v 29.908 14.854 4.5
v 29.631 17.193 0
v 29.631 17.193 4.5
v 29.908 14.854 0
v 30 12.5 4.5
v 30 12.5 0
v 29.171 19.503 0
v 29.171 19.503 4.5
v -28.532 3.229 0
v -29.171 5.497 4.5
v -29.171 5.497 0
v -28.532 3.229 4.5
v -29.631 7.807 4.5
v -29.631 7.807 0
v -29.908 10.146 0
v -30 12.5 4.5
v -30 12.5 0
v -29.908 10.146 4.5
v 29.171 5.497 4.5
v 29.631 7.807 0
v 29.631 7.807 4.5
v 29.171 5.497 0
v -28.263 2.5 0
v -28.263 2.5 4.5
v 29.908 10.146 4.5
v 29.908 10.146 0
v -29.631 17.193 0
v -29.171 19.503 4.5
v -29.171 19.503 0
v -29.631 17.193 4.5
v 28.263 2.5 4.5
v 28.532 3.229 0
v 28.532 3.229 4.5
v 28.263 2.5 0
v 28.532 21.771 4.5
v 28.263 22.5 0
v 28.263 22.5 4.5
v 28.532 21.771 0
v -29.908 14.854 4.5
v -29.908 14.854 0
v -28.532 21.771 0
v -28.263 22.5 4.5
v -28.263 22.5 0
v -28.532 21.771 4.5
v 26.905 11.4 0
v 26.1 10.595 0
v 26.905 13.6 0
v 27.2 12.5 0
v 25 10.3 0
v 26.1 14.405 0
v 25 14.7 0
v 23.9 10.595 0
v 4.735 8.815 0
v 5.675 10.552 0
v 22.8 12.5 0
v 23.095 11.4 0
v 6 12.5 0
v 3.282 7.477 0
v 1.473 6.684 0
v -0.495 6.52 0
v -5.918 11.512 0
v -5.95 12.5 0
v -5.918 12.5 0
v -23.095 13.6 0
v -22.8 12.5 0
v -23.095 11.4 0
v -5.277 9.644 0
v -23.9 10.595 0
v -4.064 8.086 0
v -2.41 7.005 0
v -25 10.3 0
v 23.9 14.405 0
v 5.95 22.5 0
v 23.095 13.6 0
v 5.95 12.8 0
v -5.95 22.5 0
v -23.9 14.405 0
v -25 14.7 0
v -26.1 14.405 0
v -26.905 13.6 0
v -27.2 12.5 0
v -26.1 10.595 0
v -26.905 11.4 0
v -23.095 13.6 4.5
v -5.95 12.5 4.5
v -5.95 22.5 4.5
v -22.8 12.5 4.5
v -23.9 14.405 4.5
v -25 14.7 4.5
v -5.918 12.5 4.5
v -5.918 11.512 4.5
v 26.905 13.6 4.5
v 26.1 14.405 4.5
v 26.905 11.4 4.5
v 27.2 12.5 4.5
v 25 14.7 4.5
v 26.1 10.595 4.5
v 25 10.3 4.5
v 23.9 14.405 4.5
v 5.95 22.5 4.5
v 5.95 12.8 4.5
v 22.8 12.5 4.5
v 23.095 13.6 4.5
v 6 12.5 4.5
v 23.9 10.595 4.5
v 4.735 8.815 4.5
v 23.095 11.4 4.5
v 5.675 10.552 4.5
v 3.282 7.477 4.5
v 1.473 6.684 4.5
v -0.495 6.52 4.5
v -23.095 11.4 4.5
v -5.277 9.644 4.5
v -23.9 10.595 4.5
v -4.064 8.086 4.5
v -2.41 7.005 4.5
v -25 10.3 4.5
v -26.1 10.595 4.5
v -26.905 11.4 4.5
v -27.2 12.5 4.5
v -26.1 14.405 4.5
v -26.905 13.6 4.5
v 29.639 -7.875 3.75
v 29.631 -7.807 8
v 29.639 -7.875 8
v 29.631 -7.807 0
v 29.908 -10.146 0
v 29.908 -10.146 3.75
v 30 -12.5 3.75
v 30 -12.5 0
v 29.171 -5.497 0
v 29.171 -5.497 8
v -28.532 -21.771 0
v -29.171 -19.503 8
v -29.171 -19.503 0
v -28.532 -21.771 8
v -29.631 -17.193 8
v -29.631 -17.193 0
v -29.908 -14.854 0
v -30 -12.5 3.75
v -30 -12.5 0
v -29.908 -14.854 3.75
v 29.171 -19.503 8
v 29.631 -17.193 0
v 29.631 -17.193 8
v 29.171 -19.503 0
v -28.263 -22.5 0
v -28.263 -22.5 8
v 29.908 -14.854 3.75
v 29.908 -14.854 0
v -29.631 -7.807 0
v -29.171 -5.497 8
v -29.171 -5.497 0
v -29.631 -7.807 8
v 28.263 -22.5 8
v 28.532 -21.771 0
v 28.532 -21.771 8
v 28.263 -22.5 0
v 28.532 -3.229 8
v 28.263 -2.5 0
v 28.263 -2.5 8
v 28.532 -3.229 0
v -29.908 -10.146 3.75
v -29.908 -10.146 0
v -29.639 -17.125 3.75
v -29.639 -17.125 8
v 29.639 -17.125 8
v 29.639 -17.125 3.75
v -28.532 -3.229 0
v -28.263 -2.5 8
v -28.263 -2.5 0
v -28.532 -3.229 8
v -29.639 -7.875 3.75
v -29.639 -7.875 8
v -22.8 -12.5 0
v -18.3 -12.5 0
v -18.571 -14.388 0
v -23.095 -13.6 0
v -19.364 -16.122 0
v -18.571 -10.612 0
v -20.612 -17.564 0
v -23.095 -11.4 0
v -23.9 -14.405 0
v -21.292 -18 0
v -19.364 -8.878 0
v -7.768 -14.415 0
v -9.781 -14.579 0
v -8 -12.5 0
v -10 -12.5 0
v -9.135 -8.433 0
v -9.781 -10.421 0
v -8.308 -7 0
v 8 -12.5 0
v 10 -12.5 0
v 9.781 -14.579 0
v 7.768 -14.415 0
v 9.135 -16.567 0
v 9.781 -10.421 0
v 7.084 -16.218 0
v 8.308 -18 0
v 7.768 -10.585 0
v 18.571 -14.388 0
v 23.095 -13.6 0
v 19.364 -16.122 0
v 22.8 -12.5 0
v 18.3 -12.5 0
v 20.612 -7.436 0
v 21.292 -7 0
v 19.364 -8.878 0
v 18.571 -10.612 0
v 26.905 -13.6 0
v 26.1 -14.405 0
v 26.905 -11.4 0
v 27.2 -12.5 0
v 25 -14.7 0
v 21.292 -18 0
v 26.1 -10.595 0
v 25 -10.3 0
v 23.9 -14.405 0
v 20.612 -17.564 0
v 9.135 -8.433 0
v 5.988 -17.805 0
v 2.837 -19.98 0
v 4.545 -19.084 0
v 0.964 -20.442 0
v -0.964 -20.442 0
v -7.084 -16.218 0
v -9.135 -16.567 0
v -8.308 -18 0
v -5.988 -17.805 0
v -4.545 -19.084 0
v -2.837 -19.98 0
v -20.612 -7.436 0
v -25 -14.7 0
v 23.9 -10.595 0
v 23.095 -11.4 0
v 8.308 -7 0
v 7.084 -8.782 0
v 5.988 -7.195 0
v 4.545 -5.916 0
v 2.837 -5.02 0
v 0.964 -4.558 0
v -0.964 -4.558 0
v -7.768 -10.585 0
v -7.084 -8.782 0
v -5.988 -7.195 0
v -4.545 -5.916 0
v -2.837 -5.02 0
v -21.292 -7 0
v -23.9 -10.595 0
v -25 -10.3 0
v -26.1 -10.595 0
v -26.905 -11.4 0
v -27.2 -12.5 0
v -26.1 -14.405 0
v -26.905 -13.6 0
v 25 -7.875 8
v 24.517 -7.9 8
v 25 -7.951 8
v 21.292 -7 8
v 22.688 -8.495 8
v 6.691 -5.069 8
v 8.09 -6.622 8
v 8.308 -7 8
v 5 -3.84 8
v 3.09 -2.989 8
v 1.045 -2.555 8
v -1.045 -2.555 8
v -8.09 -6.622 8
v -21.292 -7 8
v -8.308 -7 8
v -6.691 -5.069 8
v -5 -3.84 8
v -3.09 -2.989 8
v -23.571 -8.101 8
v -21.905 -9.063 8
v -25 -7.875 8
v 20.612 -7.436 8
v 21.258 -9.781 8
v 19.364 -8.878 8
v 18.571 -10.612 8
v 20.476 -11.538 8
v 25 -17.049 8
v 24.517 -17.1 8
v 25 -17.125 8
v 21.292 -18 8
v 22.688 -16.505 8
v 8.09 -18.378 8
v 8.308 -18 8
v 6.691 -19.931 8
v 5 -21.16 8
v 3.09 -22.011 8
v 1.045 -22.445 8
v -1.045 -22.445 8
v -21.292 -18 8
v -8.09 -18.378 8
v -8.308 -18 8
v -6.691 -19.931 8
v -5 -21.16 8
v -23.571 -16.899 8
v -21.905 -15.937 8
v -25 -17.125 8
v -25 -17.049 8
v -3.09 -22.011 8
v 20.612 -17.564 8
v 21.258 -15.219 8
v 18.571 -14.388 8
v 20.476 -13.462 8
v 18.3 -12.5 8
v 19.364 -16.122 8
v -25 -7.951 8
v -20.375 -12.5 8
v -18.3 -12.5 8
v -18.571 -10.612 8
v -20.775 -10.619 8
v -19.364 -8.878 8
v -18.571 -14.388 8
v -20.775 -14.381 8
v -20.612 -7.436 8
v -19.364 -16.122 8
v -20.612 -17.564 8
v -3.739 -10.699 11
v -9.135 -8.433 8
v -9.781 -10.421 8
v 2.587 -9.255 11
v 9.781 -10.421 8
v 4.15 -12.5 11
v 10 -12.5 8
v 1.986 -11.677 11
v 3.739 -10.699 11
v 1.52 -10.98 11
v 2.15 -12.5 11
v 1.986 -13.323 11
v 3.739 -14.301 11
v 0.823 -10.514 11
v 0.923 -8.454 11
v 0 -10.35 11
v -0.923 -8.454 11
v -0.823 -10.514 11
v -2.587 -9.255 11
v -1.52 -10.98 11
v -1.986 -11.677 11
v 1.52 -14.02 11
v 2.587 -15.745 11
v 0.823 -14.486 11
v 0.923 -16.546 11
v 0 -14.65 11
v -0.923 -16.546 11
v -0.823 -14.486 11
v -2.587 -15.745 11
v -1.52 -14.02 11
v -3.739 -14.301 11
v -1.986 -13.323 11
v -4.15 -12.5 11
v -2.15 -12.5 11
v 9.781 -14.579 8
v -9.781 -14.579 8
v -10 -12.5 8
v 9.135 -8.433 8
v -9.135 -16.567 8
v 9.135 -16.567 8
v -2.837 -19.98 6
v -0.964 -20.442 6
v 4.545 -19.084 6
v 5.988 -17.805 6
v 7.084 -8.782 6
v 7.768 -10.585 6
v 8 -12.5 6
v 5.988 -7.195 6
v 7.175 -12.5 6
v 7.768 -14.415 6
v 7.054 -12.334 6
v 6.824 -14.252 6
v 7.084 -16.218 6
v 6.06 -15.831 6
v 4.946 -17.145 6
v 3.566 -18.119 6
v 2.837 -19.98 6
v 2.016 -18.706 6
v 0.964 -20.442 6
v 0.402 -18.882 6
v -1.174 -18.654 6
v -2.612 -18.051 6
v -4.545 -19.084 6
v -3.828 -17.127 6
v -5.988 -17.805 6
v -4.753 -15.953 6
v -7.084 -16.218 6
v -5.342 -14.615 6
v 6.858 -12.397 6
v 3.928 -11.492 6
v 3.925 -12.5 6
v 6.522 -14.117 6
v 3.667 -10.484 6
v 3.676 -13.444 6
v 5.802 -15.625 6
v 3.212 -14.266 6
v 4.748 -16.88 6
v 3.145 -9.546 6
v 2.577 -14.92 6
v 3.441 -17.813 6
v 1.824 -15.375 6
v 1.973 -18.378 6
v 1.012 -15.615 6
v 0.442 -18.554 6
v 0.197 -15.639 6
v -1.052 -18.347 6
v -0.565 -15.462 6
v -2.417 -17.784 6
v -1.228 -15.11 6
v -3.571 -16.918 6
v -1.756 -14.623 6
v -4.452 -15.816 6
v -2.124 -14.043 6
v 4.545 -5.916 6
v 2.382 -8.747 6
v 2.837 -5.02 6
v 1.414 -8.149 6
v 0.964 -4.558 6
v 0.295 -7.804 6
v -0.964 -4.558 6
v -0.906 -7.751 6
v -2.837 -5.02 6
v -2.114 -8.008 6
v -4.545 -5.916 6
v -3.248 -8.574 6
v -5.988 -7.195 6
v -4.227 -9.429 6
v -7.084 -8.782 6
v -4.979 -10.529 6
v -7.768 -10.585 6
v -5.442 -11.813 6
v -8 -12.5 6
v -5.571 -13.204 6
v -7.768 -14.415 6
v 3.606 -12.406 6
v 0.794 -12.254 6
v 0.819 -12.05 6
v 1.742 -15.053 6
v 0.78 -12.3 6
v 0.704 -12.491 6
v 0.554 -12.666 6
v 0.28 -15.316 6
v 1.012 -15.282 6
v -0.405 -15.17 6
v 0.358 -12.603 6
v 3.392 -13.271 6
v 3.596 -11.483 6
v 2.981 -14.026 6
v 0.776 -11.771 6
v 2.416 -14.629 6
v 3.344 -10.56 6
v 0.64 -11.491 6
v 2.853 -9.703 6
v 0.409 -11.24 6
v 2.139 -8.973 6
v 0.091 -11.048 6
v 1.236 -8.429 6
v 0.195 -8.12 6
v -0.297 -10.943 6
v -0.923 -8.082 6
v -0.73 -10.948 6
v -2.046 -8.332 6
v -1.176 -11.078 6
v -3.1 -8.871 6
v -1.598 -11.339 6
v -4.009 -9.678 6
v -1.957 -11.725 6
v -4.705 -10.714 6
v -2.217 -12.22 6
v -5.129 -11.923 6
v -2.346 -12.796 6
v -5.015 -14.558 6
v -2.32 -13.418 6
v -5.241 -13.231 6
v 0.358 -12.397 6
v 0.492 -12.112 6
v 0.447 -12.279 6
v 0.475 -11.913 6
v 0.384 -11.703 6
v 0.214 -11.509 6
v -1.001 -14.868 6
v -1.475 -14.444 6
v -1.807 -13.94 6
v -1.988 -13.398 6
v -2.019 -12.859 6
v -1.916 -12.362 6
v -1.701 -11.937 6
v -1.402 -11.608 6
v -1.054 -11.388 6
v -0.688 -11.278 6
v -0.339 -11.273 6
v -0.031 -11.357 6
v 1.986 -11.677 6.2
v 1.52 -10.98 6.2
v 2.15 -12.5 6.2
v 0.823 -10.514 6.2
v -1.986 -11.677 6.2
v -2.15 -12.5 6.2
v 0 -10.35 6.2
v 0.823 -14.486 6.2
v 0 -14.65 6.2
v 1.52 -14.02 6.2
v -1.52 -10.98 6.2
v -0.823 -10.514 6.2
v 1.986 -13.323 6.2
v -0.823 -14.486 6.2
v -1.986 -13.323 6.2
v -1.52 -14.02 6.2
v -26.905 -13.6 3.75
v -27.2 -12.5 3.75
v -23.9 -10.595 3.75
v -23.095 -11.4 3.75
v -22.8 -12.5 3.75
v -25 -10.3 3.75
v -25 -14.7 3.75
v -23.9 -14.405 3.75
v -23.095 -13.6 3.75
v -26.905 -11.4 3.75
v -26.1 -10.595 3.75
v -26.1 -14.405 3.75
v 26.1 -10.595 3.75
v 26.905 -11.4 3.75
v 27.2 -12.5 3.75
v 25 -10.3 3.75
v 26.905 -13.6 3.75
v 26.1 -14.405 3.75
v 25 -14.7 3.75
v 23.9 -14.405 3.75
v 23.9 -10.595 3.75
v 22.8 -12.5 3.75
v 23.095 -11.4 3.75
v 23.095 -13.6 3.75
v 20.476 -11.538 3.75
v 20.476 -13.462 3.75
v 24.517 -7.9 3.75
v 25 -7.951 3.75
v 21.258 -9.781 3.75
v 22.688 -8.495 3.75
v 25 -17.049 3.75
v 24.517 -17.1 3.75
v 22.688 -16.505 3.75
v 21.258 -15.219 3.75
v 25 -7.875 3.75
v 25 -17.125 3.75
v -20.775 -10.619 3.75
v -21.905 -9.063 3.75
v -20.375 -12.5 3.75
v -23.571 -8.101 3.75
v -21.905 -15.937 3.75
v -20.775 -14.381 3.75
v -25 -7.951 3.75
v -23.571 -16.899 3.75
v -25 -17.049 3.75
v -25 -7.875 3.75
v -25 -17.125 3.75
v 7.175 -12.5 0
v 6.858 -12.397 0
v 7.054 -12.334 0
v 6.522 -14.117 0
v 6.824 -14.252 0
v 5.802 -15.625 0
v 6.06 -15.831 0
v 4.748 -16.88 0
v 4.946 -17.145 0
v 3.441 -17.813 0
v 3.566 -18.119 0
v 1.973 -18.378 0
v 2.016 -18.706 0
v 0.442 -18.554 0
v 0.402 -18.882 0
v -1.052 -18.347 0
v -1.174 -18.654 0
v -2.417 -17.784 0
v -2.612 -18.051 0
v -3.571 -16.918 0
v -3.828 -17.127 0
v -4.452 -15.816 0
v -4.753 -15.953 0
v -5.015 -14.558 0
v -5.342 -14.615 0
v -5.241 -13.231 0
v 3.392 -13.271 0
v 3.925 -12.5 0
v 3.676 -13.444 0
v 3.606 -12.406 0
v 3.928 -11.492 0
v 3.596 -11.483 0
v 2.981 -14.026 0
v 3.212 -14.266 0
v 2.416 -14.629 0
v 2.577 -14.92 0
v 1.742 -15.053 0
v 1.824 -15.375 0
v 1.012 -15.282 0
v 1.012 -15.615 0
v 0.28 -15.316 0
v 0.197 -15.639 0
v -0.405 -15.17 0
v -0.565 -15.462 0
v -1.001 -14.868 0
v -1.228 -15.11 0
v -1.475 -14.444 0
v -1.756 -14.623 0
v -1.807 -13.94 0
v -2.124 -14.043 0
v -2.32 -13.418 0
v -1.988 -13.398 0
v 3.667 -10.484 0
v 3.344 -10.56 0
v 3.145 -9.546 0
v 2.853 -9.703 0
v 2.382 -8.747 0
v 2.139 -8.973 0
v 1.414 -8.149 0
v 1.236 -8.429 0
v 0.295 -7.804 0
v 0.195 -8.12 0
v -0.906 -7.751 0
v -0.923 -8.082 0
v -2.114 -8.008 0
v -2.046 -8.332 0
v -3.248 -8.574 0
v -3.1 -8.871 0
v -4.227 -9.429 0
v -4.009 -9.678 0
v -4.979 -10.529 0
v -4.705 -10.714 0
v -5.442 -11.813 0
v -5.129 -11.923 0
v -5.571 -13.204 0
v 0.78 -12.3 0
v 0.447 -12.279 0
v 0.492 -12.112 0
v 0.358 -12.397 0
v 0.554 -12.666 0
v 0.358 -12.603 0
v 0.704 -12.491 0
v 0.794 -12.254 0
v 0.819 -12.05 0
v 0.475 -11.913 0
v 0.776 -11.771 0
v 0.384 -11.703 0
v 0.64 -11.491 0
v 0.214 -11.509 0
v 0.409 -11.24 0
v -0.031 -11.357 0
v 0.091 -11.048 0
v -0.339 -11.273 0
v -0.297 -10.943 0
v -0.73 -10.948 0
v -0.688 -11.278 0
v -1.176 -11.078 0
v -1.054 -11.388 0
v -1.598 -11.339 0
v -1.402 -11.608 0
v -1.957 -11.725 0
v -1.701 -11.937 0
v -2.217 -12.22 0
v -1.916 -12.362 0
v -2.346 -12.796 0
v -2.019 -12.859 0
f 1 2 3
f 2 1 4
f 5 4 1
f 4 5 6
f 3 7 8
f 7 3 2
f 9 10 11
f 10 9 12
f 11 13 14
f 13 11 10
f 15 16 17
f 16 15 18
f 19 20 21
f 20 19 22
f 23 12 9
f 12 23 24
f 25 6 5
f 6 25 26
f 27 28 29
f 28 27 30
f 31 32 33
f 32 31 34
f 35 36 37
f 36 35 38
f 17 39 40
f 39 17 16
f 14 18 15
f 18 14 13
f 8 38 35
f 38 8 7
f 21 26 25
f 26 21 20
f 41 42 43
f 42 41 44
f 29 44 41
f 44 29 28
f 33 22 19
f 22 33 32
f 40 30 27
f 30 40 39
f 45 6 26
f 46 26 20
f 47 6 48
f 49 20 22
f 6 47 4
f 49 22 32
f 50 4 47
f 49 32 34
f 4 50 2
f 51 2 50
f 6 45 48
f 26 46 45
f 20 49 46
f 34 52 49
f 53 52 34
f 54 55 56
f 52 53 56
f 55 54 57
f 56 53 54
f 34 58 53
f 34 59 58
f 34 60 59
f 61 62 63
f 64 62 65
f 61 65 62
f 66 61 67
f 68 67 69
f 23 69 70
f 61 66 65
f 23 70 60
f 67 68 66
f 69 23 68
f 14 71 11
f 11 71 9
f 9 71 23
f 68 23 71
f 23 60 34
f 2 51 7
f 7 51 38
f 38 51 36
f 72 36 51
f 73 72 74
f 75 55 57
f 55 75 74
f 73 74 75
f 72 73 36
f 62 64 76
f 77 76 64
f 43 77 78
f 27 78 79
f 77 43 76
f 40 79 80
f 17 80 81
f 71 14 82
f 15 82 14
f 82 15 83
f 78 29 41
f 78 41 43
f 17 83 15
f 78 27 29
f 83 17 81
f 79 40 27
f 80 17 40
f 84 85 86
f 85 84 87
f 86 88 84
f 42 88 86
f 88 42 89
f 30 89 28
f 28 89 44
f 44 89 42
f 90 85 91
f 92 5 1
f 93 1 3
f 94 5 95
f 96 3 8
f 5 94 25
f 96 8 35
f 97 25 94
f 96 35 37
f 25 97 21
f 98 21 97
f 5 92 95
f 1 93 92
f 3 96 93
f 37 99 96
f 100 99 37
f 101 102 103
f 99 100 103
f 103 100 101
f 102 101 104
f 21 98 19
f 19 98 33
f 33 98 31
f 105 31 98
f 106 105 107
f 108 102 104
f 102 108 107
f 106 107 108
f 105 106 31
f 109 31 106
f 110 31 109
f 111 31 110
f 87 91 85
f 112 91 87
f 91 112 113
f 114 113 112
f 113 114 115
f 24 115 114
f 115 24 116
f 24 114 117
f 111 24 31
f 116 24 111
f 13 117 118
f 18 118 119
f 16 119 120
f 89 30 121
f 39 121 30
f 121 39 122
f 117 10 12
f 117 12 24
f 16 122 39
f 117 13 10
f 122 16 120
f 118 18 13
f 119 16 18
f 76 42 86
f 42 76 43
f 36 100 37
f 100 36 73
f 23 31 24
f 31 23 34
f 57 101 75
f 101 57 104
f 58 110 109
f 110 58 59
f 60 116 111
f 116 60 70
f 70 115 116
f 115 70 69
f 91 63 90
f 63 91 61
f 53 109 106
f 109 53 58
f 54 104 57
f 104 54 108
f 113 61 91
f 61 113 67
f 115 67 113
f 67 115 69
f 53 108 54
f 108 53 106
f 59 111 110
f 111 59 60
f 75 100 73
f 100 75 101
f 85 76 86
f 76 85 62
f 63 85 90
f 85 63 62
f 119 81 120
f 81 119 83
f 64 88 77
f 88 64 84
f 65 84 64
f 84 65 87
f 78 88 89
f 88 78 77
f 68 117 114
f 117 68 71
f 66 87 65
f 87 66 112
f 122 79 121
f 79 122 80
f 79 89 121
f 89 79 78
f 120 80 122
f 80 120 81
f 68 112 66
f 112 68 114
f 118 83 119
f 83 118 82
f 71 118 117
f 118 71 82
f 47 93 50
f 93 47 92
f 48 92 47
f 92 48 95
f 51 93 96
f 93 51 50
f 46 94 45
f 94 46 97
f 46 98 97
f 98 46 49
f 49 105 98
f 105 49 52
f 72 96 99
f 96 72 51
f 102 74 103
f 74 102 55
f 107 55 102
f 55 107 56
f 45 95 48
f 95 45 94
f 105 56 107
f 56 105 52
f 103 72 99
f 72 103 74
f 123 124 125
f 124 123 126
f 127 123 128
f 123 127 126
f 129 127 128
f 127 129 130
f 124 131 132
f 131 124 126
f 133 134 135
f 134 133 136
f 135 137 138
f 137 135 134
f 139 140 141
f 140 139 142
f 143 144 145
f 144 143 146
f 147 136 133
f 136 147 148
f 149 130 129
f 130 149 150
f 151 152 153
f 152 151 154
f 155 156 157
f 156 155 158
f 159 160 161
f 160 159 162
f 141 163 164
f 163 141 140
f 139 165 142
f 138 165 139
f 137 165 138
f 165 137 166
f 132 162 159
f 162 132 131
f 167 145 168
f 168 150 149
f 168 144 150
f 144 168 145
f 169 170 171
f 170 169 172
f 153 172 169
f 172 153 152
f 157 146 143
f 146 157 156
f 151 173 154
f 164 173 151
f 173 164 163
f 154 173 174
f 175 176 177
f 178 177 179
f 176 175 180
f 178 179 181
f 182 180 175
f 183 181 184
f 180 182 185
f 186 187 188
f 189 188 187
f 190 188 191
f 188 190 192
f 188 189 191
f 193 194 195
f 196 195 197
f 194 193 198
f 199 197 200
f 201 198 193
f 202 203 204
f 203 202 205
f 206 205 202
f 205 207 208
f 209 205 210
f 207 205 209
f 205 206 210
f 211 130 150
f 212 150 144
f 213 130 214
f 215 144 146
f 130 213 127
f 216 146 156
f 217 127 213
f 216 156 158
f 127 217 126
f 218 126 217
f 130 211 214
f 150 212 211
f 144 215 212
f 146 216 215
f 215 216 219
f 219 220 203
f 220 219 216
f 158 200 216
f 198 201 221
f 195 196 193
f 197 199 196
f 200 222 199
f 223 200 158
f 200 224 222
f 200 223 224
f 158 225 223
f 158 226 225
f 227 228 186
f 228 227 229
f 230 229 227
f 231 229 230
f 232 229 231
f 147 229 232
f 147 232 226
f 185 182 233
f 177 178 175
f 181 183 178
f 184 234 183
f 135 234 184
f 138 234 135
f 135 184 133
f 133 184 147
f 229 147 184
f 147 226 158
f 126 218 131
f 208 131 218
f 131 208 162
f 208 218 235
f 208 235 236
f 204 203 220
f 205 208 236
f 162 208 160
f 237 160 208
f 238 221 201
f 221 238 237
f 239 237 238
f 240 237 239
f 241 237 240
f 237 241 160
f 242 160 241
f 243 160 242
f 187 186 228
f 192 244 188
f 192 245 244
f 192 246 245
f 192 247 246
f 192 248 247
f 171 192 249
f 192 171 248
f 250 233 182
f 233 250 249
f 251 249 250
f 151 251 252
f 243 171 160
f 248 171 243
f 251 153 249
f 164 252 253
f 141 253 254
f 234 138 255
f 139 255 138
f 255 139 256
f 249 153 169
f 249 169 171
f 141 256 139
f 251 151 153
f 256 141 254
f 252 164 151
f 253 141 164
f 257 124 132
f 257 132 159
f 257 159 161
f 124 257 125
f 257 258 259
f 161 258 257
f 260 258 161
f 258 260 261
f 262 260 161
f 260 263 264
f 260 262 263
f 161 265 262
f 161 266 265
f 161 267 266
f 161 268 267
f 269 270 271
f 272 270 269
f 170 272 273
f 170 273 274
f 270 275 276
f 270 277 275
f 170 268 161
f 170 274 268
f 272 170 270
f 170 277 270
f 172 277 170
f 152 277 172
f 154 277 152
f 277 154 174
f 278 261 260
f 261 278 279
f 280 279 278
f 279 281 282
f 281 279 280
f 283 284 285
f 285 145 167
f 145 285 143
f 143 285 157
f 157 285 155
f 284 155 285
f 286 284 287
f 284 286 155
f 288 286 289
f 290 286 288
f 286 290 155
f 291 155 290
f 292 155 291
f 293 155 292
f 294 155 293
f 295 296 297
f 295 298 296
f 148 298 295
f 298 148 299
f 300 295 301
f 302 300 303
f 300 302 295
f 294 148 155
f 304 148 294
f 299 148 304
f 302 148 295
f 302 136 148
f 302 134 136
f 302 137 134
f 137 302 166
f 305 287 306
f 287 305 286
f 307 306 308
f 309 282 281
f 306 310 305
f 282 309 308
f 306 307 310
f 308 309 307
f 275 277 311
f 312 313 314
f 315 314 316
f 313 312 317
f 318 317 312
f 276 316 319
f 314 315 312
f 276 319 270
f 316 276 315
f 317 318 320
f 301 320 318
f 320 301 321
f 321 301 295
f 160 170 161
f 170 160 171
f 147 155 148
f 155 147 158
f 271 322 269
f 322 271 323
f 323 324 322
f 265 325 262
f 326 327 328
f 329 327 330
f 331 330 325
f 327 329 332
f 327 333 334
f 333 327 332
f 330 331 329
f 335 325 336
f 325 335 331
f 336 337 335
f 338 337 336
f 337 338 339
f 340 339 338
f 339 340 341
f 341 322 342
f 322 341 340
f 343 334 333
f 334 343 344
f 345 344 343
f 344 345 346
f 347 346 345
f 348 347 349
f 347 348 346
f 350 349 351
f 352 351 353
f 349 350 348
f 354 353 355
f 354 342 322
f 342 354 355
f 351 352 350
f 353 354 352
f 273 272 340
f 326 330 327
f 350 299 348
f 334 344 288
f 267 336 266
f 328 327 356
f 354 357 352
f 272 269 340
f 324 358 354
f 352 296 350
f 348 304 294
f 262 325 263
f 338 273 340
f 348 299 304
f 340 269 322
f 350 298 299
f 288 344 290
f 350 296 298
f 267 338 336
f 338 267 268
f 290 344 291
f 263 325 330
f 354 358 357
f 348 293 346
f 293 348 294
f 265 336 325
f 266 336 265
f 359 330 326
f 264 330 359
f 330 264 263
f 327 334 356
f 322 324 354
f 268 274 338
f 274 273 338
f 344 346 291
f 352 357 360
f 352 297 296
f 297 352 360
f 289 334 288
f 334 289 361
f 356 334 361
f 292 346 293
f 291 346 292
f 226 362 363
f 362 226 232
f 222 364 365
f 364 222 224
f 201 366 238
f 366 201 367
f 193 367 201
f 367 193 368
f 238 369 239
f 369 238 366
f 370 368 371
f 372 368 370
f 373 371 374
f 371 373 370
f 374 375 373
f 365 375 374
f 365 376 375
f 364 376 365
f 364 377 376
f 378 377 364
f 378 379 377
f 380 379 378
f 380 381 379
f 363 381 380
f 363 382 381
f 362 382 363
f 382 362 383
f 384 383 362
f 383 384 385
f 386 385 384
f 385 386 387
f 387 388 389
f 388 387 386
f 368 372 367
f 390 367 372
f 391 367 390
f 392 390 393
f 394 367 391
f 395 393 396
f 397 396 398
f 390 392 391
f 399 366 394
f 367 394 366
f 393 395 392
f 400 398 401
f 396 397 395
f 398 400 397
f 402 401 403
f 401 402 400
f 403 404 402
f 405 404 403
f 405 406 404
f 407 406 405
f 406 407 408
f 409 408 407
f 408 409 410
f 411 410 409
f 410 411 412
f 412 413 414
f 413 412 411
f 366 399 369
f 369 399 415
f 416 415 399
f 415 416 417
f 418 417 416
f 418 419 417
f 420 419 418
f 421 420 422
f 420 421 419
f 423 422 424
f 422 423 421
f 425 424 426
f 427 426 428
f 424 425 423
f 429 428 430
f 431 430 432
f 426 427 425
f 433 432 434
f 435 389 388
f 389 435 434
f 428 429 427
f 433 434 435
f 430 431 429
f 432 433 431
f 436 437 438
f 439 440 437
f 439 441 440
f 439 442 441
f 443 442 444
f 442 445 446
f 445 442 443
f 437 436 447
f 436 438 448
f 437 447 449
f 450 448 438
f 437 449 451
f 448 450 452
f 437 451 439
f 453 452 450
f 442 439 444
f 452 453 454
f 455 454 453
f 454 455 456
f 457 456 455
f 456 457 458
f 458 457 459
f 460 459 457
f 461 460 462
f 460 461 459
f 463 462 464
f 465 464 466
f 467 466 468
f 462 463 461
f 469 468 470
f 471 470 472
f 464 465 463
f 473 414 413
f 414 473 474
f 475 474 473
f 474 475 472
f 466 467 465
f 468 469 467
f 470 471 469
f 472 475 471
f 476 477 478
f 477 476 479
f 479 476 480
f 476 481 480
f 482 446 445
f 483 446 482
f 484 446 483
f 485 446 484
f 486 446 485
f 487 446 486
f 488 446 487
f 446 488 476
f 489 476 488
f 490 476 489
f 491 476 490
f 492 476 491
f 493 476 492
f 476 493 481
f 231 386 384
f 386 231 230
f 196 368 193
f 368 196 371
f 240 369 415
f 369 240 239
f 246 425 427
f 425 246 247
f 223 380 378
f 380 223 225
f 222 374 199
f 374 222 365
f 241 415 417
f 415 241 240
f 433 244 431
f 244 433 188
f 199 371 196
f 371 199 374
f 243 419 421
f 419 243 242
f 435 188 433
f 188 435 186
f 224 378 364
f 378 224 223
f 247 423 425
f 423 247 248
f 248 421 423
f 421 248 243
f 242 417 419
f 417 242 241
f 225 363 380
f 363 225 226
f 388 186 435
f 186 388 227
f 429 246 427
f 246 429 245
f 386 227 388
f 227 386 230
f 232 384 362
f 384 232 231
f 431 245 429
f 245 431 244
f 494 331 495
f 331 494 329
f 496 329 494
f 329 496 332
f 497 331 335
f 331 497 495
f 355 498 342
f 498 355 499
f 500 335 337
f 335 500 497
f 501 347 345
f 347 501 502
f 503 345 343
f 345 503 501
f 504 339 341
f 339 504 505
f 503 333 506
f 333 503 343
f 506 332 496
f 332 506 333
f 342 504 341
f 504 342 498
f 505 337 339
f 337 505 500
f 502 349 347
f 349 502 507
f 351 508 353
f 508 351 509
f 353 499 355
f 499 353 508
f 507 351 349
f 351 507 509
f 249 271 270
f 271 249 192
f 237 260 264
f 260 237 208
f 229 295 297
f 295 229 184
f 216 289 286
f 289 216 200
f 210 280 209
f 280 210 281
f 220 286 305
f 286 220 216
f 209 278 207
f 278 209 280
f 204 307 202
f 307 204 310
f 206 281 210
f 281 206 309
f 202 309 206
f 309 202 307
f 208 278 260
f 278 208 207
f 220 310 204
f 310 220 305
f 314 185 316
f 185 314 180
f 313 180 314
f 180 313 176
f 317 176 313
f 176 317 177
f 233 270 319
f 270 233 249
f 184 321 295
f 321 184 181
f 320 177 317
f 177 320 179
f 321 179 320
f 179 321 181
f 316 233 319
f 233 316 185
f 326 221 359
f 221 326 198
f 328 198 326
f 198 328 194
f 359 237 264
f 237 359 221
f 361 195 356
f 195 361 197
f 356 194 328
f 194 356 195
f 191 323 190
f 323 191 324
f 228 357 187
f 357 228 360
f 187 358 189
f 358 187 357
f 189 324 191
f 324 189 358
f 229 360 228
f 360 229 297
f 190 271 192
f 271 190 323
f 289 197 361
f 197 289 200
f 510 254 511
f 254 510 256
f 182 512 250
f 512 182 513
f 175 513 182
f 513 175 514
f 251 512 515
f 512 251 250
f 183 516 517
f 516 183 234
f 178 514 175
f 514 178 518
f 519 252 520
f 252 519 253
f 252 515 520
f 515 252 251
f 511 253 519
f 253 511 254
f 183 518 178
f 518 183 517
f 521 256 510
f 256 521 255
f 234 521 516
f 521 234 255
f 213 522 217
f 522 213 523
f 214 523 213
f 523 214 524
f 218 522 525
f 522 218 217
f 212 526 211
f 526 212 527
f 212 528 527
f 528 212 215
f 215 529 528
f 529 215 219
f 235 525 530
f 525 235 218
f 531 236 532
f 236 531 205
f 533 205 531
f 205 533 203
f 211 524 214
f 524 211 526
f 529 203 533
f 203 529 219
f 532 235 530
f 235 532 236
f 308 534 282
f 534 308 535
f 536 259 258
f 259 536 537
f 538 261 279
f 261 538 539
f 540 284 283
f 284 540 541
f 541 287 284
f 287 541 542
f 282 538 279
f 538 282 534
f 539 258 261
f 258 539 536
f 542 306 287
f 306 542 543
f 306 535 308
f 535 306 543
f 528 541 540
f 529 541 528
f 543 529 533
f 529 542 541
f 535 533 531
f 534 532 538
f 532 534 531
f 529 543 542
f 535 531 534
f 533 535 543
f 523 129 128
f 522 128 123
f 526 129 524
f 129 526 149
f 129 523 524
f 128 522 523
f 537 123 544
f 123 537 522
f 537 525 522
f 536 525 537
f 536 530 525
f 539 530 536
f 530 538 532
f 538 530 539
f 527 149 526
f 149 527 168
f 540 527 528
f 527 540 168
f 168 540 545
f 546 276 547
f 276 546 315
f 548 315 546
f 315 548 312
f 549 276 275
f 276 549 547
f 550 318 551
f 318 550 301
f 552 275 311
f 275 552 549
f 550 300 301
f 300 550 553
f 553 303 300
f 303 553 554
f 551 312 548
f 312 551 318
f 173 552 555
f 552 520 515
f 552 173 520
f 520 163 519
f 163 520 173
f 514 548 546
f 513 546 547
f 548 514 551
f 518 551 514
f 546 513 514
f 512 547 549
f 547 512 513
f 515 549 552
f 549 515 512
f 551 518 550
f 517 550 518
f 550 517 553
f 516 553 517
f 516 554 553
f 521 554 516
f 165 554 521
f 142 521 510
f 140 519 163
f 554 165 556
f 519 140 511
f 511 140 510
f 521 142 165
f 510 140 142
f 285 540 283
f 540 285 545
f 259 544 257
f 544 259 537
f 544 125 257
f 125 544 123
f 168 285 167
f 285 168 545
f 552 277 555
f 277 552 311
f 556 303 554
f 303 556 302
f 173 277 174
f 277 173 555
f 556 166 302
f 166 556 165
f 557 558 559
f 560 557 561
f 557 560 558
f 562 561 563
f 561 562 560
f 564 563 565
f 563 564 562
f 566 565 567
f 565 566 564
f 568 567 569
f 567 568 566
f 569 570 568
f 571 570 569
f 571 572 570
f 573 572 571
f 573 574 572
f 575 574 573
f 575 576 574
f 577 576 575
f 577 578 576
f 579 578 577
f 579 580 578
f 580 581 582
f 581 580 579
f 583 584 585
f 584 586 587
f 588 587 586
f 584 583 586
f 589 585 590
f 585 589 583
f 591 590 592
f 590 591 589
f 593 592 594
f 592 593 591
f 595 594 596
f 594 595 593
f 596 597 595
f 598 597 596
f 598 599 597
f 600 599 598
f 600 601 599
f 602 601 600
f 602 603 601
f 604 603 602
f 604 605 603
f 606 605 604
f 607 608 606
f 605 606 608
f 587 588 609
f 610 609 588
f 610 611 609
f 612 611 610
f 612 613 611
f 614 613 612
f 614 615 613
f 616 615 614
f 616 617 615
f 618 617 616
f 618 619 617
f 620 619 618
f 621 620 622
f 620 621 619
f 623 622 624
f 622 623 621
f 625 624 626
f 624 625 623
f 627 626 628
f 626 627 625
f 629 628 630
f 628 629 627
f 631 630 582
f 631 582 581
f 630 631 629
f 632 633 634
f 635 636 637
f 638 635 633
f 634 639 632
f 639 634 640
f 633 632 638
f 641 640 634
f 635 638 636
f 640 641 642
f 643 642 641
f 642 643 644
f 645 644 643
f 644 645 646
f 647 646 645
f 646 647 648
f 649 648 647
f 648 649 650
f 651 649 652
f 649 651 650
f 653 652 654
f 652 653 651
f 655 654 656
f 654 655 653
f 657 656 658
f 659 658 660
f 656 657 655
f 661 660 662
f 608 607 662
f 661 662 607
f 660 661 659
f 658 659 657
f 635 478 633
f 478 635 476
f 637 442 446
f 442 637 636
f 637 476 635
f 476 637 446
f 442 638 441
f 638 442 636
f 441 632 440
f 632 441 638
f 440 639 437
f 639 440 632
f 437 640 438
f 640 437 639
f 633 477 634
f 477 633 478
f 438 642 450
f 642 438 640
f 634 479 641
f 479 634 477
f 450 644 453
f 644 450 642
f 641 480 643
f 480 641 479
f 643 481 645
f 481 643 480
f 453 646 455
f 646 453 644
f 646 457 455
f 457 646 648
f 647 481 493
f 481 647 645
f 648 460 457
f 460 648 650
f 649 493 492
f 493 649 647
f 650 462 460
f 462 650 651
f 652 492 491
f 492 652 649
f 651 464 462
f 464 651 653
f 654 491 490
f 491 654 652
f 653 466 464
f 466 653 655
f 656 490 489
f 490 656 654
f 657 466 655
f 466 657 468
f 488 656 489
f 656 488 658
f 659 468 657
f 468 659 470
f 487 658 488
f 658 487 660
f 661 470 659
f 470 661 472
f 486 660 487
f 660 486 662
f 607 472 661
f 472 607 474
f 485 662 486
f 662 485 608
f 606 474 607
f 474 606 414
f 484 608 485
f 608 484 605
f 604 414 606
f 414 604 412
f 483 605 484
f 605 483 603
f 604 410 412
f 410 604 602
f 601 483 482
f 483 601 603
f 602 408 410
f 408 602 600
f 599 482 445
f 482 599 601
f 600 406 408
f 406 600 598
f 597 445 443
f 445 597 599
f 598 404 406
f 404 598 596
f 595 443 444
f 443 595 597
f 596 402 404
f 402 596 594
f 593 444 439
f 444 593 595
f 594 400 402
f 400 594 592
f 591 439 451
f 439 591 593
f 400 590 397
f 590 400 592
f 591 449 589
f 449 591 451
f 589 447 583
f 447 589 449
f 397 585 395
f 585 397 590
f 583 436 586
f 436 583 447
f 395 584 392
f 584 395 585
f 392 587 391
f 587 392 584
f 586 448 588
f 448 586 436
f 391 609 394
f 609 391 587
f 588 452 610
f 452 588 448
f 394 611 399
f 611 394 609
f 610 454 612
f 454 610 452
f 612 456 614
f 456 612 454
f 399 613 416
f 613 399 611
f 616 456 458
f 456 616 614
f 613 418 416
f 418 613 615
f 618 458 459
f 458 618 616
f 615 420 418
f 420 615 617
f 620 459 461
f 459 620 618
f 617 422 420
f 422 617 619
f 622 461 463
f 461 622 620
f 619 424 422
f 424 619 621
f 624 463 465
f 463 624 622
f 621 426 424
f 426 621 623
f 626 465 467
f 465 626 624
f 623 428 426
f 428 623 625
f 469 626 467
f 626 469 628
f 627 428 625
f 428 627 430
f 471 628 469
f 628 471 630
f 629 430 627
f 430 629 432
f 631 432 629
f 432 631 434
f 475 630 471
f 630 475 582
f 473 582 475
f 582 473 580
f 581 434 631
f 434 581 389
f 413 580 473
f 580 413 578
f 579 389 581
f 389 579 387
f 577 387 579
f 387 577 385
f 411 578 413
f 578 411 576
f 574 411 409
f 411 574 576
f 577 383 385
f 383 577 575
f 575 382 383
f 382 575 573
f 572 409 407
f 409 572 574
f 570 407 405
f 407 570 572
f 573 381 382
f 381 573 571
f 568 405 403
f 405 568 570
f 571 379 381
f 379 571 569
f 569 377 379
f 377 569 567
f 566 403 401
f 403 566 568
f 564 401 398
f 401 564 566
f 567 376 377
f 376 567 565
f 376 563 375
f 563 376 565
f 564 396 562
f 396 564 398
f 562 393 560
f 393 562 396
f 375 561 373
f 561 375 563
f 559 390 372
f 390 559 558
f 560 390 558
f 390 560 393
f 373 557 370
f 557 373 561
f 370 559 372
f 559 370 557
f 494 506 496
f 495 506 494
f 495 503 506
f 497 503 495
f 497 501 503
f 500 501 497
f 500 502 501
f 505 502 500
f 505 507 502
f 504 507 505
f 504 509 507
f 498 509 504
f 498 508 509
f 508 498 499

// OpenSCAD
////////////////////////////////////////////////////////////////////////////////
// Simple J-Head Mount for Rostock (Customizable) - Version 0.2

// The height of the groove mount plate (the lower one).
plate_height = 4.5;
// The height of the holding plate (the upper one).
upper_height = 8;
// The width of the mount.
plate_width = 20;
// Generate cutouts between the pneumatic fitting hole and the bolt holes?
generate_cutouts = "Yes"; // [Yes,No]
// The width of the material on either side of the cutouts.
support_width = 4.5;
// The diameter of the Rostock platform. For a standard Rostock this is 60.
platform_diameter = 60;
// The bolt circle diameter of the Rostock platform. For a standard Rostock this is 50.
platform_bcd = 50;
// The diameter of the groove on the J-Head body. For a J-Head MK VI this is 12.
jhead_groove_diameter = 12.0;
// The diameter of the J-Head body. For a J-Head MK VI this is 16.
jhead_body_diameter = 16.0;
// The length of the J-Head body that is above the groove mount plate.
jhead_upper_height = 6.0;
// The bolt recess depth. If this value is too small then it will overridden to zero.
desired_bolt_recess_depth = 4.25;
// The hole size for the pneumatic fitting. This should be smaller than the outer thread size so that it can be tapped.
pneumatic_fitting_drill_diameter = 4.3;
// The length of threads on the pneumatic fitting.
pneumatic_fitting_thread_length = 5;
// Should supports be generated? 
generate_support = "Yes"; // [Yes,No]
// The layer height. This is used for generating the support.
layer_height = 0.20;
// The layer thickness/width. This is used for generating the support.
layer_width = 0.35;
// The distance between the two parts.
spacing = 5;
// What objects should be generated?
generate = "Both"; // [Both,Holding Plate,Groove Plate]
// Configuration of the groove mount plate and holding plate. Can be either single or double.
configuration = "Single"; // [Single,Double]
// The distance between the two J-Head bodies when mounted.
jhead_spacing = 2;

jhead_centers = (configuration=="Double")?[[-(jhead_body_diameter/2)-(jhead_spacing/2),0,0],[+(jhead_body_diameter/2)+(jhead_spacing/2),0,0]]:[[0,0,0]];


// Other Settings and stuff that arn't shown in customizer.
m4_clearance_diameter = 4.4*1;
m4_washer_diameter = 9.25*1;
wall_thickness_for_pneumatic_fitting = 2*1;
jhead_slot_width = jhead_groove_diameter-0.1;
bolt_recess_depth = (desired_bolt_recess_depth>=upper_height)?0:desired_bolt_recess_depth;
extra = 0.1*1;


////////////////////////////////////////////////////////////////////////////////
// spiral_support

module spiral_support(inner_diameter, outer_diameter, height, rotation=720,segments=50) {
	diff = (outer_diameter-inner_diameter)/2;
	for(i=[1:segments]) {
		hull() {
			rotate([0,0,(i-1)*(rotation/segments)]) translate([(inner_diameter/2)+((i-1)*(diff/segments)),0,0]) cylinder(r=layer_width/2,h=height);
			rotate([0,0,i*(rotation/segments)]) translate([(inner_diameter/2)+(i*(diff/segments)),0,0]) cylinder(r=layer_width/2,h=height);
		}
	}
}


////////////////////////////////////////////////////////////////////////////////
// jhead_mount_groove_plate

module jhead_mount_groove_plate() {
	translate([0,0,plate_height/2]) difference() {
		intersection() {
			cylinder(r=platform_diameter/2,h=plate_height,$fn=80,center=true);
			cube([platform_diameter,plate_width,plate_height],center=true);
		}
		translate([-platform_bcd/2,0,0]) cylinder(r=m4_clearance_diameter/2,h=plate_height+(2*extra),center=true,$fn=12);
		translate([platform_bcd/2,0,0]) cylinder(r=m4_clearance_diameter/2,h=plate_height+(2*extra),center=true,$fn=12);
		if(configuration=="Double") {
			translate([-(jhead_body_diameter/2)-(jhead_spacing/2),0,0]) cylinder(r=(jhead_groove_diameter/2),h=plate_height+(2*extra),center=true);
			translate([-(jhead_body_diameter/2)-(jhead_spacing/2),(plate_width/4)+(extra/2),0]) cube([jhead_slot_width,(plate_width/2)+extra,plate_height+(2*extra)],center=true);
			translate([+(jhead_body_diameter/2)+(jhead_spacing/2),0,0]) cylinder(r=(jhead_groove_diameter/2),h=plate_height+(2*extra),center=true);
			translate([(jhead_body_diameter/2)+(jhead_spacing/2),-(plate_width/4)-(extra/2),0]) cube([jhead_slot_width,(plate_width/2)+extra,plate_height+(2*extra)],center=true);
		} else if(configuration=="Single") {
			cylinder(r=(jhead_groove_diameter/2),h=plate_height+(2*extra),center=true);
			translate([0,(plate_width/4)+(extra/2),0]) cube([jhead_slot_width,(plate_width/2)+extra,plate_height+(2*extra)],center=true);
		}
	}
}


////////////////////////////////////////////////////////////////////////////////
// jhead_mount_holding_plate

module jhead_mount_holding_plate() {
	translate([0,0,upper_height/2]) {
		difference() {
			union() {
				hull() {
					for(i=jhead_centers) {
						translate([i[0],i[1],-(upper_height/2)+jhead_upper_height]) cylinder(r=(pneumatic_fitting_drill_diameter/2)+wall_thickness_for_pneumatic_fitting,h=pneumatic_fitting_thread_length);
						translate([i[0],i[1],-(upper_height/2)]) cylinder(r=(plate_width/2),h=max(upper_height,jhead_upper_height));
					}
				}
				intersection() {
					cylinder(r=platform_diameter/2,h=upper_height,center=true,$fn=80);
					cube([platform_diameter,plate_width,upper_height],center=true);
				}
			}
			translate([-platform_bcd/2,0,0]) cylinder(r=m4_clearance_diameter/2,h=upper_height+(2*extra),center=true,$fn=12);
			translate([platform_bcd/2,0,0]) cylinder(r=m4_clearance_diameter/2,h=upper_height+(2*extra),center=true,$fn=12);

	for(i=jhead_centers) {
			translate([i[0],i[1],-(upper_height/2)-extra]) cylinder(r=jhead_body_diameter/2,h=jhead_upper_height+(extra));
			translate([i[0],i[1],-(upper_height/2)+(jhead_upper_height)-extra]) cylinder(r=pneumatic_fitting_drill_diameter/2,h=max(pneumatic_fitting_thread_length+(2*extra),upper_height-jhead_upper_height+(2*extra)),$fn=16);
}
			if((generate_cutouts=="Yes")&&(configuration!="Double")) {
				difference() {
					intersection() {
						cube([platform_diameter,plate_width-(2*support_width),upper_height+(2*extra)],center=true);
						cylinder(r=(platform_diameter/2)-support_width,h=upper_height+(2*extra),center=true);
					}
					translate([platform_bcd/2,0,0]) cylinder(r=(m4_clearance_diameter/2)+support_width,h=upper_height+(2*extra),center=true);
					translate([-platform_bcd/2,0,0]) cylinder(r=(m4_clearance_diameter/2)+support_width,h=upper_height+(2*extra),center=true);
					for(i=jhead_centers) {
					translate([i[0],i[1],0]) cylinder(r=(plate_width/2),h=upper_height+(2*extra),center=true);
}
				}
			}
			translate([platform_bcd/2,0,(upper_height/2)-bolt_recess_depth]) cylinder(r=(m4_washer_diameter/2),h=bolt_recess_depth+extra);
			translate([-platform_bcd/2,0,(upper_height/2)-bolt_recess_depth]) cylinder(r=(m4_washer_diameter/2),h=bolt_recess_depth+extra);
			translate([platform_bcd/2,-(m4_washer_diameter/2),(upper_height/2)-bolt_recess_depth]) cube([((platform_diameter-platform_bcd)/2)+extra,m4_washer_diameter,bolt_recess_depth+extra]);
			translate([-(platform_bcd/2)-((platform_diameter-platform_bcd)/2)-extra,-(m4_washer_diameter/2),(upper_height/2)-bolt_recess_depth]) cube([((platform_diameter-platform_bcd)/2)+extra,m4_washer_diameter,bolt_recess_depth+extra]);
		}
		if(generate_support=="Yes") {
			for(i=jhead_centers) {
				translate([i[0],i[1],-upper_height/2]) spiral_support(outer_diameter=jhead_body_diameter-2,inner_diameter=1,height=jhead_upper_height,rotation=720);
				translate([i[0],i[1],-(upper_height/2)+jhead_upper_height]) cylinder(r=jhead_body_diameter/2,h=layer_height);
			}
		}
	}
}

////////////////////////////////////////////////////////////////////////////////
// Main

if(generate=="Both") {
	translate([0,(plate_width/2)+(spacing/2),0]) 
		jhead_mount_groove_plate();
	translate([0,-(plate_width/2)-(spacing/2),0])
		jhead_mount_holding_plate();
} else if(generate=="Groove Plate") {
	jhead_mount_groove_plate();
} else if(generate=="Holding Plate") {
	jhead_mount_holding_plate();
}
